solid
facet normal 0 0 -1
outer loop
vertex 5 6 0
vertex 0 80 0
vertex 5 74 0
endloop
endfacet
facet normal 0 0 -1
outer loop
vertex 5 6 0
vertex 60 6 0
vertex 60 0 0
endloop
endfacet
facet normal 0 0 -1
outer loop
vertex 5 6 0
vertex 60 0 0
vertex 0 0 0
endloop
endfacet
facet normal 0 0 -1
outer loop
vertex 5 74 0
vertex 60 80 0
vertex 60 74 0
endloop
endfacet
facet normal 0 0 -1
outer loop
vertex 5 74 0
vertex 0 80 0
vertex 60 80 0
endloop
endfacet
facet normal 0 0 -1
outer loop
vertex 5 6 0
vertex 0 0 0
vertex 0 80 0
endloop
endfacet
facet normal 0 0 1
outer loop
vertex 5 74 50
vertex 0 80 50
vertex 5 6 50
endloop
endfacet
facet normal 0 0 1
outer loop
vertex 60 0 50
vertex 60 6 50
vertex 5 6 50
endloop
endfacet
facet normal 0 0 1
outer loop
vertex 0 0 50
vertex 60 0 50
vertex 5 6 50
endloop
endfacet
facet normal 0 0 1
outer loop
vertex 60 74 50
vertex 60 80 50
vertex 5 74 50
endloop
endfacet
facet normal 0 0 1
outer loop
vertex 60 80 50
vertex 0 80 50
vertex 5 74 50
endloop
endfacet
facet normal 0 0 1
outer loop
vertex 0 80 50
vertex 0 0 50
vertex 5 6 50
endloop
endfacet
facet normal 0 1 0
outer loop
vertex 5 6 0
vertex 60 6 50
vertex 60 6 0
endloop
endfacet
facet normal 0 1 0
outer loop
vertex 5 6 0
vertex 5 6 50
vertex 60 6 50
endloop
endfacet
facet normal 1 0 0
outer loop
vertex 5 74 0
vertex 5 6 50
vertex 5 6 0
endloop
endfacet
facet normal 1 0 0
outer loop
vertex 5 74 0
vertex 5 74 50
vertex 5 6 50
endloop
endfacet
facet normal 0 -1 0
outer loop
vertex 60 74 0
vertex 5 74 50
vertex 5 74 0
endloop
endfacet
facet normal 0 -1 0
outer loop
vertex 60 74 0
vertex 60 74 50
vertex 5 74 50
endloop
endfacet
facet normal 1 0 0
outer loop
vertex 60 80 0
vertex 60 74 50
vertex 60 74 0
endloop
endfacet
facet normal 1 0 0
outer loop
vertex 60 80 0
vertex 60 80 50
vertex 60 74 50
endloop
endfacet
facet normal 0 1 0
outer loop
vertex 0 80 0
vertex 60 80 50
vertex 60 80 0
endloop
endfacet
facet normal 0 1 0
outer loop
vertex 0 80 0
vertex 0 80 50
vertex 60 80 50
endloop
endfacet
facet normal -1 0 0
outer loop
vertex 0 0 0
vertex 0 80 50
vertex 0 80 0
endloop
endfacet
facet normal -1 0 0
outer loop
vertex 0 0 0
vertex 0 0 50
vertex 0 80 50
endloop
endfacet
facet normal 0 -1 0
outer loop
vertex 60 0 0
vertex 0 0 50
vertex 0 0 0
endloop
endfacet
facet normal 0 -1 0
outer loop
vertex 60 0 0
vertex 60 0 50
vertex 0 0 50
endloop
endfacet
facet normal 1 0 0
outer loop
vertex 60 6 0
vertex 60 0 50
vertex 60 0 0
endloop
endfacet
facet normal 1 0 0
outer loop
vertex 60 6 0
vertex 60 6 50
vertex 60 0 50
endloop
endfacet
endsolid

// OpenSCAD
$fn = 32;

// ----------------------------------------------------------------------
// Structural section: channel 60 x 80 mm
// ----------------------------------------------------------------------

// --- parameters (mm) ---
sec_w = 60;               // channel width, X
sec_h = 80;               // channel height, Y
flange_t = 6;             // flange thickness
web_t = 5;                // web thickness
plate_t = 50;             // cut length, Z (extrusion height)

profile = [[0, 0], [60, 0], [60, 6], [5, 6], [5, 74], [60, 74], [60, 80], [0, 80]];  // primary outline, 8 points, counter clockwise

// --- the one profile operation ---
linear_extrude(height = plate_t) polygon(points = profile);
